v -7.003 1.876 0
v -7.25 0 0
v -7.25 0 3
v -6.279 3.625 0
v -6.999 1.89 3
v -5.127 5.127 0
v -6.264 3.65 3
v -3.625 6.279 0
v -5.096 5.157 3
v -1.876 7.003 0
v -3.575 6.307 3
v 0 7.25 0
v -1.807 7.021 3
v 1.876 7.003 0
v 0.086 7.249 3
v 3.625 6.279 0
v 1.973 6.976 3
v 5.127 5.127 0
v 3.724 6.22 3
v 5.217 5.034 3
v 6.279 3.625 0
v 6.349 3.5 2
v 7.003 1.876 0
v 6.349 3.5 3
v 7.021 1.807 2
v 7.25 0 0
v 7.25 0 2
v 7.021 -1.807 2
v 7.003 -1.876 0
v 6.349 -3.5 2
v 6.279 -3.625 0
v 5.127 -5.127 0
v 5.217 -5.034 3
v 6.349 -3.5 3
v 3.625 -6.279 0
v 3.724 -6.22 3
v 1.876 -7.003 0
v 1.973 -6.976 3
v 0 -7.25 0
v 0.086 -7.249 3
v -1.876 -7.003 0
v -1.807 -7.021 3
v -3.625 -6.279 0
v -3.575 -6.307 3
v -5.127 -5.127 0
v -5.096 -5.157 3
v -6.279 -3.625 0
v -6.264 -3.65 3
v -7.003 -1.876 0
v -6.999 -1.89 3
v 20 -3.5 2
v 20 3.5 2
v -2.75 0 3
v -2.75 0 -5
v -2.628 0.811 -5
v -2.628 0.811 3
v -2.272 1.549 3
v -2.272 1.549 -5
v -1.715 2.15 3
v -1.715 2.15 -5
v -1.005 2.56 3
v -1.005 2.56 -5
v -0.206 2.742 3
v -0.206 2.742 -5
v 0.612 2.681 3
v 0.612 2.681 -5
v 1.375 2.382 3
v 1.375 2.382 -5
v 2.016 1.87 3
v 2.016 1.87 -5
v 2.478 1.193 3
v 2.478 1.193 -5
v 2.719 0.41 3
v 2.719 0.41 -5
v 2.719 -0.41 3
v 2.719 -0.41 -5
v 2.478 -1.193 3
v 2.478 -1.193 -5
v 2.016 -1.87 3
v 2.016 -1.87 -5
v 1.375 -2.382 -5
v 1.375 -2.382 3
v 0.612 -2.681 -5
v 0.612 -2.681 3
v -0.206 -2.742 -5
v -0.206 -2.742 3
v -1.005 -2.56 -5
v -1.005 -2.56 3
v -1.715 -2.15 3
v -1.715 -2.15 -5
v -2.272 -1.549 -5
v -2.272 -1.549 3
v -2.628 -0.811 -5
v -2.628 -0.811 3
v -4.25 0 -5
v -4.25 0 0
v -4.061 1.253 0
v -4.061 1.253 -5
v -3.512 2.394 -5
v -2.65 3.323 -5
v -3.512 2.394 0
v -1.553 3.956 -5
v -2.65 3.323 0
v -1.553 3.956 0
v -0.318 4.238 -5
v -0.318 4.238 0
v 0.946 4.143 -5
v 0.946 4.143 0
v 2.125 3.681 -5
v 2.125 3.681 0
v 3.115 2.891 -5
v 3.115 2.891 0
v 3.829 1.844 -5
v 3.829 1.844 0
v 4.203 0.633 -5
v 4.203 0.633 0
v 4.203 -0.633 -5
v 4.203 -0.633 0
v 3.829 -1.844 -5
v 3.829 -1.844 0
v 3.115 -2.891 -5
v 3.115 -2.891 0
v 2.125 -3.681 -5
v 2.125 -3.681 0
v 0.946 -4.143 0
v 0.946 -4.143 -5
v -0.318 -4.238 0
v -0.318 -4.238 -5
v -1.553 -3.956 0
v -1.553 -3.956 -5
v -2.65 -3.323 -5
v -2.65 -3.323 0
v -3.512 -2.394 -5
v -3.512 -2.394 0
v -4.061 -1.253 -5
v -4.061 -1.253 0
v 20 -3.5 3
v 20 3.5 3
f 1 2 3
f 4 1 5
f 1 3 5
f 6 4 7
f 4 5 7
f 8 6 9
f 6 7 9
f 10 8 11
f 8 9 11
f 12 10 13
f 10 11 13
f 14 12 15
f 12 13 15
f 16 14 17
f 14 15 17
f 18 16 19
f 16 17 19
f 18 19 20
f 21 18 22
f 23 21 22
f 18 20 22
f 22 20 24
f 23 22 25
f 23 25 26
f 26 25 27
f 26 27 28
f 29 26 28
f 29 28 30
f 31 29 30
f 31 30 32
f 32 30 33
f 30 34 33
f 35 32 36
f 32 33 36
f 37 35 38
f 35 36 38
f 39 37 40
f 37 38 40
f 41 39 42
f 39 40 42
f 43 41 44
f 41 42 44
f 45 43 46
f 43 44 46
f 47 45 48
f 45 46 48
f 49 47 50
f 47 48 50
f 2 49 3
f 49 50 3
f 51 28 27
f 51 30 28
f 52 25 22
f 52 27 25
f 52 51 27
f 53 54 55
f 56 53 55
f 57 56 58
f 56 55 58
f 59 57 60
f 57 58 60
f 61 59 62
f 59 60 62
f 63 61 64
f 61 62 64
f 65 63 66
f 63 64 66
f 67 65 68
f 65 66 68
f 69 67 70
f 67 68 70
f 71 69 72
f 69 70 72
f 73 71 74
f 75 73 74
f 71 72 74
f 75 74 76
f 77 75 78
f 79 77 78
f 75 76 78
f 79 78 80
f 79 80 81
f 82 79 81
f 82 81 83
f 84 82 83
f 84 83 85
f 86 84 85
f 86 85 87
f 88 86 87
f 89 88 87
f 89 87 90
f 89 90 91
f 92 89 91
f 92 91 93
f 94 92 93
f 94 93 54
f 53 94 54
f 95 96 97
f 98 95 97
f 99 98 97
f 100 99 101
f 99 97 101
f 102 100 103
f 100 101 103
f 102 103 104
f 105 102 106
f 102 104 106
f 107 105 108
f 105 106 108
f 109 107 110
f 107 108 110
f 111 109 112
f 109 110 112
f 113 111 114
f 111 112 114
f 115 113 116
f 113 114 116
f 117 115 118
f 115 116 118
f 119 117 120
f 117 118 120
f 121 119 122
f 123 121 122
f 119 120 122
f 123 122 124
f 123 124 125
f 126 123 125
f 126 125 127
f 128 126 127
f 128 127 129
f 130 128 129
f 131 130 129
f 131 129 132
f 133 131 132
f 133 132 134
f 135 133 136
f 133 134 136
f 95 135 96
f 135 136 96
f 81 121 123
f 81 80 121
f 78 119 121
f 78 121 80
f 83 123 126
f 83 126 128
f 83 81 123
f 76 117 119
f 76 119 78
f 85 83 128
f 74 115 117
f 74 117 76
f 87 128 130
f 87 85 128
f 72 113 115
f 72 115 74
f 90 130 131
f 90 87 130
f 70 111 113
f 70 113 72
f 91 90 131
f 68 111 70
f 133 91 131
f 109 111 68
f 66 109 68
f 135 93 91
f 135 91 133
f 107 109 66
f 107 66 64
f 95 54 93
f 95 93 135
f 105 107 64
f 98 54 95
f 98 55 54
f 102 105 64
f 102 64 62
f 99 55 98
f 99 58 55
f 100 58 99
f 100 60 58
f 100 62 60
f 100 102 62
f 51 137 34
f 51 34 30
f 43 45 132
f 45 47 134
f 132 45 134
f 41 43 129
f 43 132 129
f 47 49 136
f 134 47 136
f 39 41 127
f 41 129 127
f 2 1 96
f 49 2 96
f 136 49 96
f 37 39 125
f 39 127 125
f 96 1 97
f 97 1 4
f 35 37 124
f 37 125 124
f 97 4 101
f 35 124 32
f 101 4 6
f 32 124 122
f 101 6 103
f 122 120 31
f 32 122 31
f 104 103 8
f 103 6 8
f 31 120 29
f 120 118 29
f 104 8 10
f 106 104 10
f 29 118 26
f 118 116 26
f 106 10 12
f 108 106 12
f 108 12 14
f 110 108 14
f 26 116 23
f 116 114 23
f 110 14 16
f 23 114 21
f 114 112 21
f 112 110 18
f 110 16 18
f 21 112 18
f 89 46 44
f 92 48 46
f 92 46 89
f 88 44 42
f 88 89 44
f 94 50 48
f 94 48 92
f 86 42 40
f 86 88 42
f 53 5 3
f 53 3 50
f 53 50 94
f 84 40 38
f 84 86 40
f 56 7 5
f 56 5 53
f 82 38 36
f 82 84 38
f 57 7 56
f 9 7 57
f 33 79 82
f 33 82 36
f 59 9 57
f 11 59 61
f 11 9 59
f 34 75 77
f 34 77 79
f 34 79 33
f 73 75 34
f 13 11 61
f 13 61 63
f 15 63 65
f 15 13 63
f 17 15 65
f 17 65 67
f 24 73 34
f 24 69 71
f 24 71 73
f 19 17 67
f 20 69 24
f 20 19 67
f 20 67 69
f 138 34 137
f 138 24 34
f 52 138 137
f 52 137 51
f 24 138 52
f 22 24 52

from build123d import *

# Parameters (mm, degrees)
SKETCH_1_W              = 7.25
SKETCH_1_H              = 3
EXTRUDE_1_REACH         = 30.357
EXTRUDE_1_END_RADIUS    = 7.25
SKETCH_2_W              = 1
SKETCH_2_H              = 7
SKETCH_3_R              = 4.25
EXTRUDE_2_DEPTH         = 5
HOLE_WIZARD_5_5_5_5_1_D = 5.5


with BuildPart() as part:
    # Эскиз1 → Повернуть1 (revolve)
    with BuildSketch(Plane.XZ, mode=Mode.PRIVATE) as revolve_1_sk:
        with Locations((3.625, 1.5)):
            Rectangle(SKETCH_1_W, SKETCH_1_H)
    revolve(revolve_1_sk.sketch.rotate(Axis((0, 0, 3), (0, 0, -1)), 180), axis=Axis((0, 0, 3), (0, 0, -1)))

    # Бобышка-Вытянуть1: up to this cylinder (the profile starts outside it)
    extrude_1_end = Plane(origin=(0, 0, 2.5), z_dir=(0, 0, -1)) * Cylinder(EXTRUDE_1_END_RADIUS, 76.214, mode=Mode.PRIVATE)
    # Эскиз2 → Бобышка-Вытянуть1 (add, up to the surface)
    with BuildSketch(Plane(origin=(20, 0, 0), x_dir=(0, 0, -1), z_dir=(1, 0, 0)), mode=Mode.PRIVATE) as extrude_1_sk1:
        with Locations((-2.5, 0)):
            Rectangle(SKETCH_2_W, SKETCH_2_H)
    extrude_1_tool1 = extrude(extrude_1_sk1.sketch, amount=-EXTRUDE_1_REACH, mode=Mode.PRIVATE) - extrude_1_end
    add(extrude_1_tool1.solids().sort_by_distance((20, 0, 2.5))[0])

    # Эскиз3 → Бобышка-Вытянуть2 (add)
    with BuildSketch(Plane(origin=(0, 0, 0), x_dir=(-1, 0, 0), z_dir=(0, 0, -1))):
        Circle(SKETCH_3_R)
    extrude(amount=EXTRUDE_2_DEPTH)

    # Диаметр отверстия Ø5.5 (5.5)1 (through all)
    with Locations(Plane.XY.offset(3)):
        with Locations((0, 0)):
            Hole(HOLE_WIZARD_5_5_5_5_1_D / 2)


solid = part.part
